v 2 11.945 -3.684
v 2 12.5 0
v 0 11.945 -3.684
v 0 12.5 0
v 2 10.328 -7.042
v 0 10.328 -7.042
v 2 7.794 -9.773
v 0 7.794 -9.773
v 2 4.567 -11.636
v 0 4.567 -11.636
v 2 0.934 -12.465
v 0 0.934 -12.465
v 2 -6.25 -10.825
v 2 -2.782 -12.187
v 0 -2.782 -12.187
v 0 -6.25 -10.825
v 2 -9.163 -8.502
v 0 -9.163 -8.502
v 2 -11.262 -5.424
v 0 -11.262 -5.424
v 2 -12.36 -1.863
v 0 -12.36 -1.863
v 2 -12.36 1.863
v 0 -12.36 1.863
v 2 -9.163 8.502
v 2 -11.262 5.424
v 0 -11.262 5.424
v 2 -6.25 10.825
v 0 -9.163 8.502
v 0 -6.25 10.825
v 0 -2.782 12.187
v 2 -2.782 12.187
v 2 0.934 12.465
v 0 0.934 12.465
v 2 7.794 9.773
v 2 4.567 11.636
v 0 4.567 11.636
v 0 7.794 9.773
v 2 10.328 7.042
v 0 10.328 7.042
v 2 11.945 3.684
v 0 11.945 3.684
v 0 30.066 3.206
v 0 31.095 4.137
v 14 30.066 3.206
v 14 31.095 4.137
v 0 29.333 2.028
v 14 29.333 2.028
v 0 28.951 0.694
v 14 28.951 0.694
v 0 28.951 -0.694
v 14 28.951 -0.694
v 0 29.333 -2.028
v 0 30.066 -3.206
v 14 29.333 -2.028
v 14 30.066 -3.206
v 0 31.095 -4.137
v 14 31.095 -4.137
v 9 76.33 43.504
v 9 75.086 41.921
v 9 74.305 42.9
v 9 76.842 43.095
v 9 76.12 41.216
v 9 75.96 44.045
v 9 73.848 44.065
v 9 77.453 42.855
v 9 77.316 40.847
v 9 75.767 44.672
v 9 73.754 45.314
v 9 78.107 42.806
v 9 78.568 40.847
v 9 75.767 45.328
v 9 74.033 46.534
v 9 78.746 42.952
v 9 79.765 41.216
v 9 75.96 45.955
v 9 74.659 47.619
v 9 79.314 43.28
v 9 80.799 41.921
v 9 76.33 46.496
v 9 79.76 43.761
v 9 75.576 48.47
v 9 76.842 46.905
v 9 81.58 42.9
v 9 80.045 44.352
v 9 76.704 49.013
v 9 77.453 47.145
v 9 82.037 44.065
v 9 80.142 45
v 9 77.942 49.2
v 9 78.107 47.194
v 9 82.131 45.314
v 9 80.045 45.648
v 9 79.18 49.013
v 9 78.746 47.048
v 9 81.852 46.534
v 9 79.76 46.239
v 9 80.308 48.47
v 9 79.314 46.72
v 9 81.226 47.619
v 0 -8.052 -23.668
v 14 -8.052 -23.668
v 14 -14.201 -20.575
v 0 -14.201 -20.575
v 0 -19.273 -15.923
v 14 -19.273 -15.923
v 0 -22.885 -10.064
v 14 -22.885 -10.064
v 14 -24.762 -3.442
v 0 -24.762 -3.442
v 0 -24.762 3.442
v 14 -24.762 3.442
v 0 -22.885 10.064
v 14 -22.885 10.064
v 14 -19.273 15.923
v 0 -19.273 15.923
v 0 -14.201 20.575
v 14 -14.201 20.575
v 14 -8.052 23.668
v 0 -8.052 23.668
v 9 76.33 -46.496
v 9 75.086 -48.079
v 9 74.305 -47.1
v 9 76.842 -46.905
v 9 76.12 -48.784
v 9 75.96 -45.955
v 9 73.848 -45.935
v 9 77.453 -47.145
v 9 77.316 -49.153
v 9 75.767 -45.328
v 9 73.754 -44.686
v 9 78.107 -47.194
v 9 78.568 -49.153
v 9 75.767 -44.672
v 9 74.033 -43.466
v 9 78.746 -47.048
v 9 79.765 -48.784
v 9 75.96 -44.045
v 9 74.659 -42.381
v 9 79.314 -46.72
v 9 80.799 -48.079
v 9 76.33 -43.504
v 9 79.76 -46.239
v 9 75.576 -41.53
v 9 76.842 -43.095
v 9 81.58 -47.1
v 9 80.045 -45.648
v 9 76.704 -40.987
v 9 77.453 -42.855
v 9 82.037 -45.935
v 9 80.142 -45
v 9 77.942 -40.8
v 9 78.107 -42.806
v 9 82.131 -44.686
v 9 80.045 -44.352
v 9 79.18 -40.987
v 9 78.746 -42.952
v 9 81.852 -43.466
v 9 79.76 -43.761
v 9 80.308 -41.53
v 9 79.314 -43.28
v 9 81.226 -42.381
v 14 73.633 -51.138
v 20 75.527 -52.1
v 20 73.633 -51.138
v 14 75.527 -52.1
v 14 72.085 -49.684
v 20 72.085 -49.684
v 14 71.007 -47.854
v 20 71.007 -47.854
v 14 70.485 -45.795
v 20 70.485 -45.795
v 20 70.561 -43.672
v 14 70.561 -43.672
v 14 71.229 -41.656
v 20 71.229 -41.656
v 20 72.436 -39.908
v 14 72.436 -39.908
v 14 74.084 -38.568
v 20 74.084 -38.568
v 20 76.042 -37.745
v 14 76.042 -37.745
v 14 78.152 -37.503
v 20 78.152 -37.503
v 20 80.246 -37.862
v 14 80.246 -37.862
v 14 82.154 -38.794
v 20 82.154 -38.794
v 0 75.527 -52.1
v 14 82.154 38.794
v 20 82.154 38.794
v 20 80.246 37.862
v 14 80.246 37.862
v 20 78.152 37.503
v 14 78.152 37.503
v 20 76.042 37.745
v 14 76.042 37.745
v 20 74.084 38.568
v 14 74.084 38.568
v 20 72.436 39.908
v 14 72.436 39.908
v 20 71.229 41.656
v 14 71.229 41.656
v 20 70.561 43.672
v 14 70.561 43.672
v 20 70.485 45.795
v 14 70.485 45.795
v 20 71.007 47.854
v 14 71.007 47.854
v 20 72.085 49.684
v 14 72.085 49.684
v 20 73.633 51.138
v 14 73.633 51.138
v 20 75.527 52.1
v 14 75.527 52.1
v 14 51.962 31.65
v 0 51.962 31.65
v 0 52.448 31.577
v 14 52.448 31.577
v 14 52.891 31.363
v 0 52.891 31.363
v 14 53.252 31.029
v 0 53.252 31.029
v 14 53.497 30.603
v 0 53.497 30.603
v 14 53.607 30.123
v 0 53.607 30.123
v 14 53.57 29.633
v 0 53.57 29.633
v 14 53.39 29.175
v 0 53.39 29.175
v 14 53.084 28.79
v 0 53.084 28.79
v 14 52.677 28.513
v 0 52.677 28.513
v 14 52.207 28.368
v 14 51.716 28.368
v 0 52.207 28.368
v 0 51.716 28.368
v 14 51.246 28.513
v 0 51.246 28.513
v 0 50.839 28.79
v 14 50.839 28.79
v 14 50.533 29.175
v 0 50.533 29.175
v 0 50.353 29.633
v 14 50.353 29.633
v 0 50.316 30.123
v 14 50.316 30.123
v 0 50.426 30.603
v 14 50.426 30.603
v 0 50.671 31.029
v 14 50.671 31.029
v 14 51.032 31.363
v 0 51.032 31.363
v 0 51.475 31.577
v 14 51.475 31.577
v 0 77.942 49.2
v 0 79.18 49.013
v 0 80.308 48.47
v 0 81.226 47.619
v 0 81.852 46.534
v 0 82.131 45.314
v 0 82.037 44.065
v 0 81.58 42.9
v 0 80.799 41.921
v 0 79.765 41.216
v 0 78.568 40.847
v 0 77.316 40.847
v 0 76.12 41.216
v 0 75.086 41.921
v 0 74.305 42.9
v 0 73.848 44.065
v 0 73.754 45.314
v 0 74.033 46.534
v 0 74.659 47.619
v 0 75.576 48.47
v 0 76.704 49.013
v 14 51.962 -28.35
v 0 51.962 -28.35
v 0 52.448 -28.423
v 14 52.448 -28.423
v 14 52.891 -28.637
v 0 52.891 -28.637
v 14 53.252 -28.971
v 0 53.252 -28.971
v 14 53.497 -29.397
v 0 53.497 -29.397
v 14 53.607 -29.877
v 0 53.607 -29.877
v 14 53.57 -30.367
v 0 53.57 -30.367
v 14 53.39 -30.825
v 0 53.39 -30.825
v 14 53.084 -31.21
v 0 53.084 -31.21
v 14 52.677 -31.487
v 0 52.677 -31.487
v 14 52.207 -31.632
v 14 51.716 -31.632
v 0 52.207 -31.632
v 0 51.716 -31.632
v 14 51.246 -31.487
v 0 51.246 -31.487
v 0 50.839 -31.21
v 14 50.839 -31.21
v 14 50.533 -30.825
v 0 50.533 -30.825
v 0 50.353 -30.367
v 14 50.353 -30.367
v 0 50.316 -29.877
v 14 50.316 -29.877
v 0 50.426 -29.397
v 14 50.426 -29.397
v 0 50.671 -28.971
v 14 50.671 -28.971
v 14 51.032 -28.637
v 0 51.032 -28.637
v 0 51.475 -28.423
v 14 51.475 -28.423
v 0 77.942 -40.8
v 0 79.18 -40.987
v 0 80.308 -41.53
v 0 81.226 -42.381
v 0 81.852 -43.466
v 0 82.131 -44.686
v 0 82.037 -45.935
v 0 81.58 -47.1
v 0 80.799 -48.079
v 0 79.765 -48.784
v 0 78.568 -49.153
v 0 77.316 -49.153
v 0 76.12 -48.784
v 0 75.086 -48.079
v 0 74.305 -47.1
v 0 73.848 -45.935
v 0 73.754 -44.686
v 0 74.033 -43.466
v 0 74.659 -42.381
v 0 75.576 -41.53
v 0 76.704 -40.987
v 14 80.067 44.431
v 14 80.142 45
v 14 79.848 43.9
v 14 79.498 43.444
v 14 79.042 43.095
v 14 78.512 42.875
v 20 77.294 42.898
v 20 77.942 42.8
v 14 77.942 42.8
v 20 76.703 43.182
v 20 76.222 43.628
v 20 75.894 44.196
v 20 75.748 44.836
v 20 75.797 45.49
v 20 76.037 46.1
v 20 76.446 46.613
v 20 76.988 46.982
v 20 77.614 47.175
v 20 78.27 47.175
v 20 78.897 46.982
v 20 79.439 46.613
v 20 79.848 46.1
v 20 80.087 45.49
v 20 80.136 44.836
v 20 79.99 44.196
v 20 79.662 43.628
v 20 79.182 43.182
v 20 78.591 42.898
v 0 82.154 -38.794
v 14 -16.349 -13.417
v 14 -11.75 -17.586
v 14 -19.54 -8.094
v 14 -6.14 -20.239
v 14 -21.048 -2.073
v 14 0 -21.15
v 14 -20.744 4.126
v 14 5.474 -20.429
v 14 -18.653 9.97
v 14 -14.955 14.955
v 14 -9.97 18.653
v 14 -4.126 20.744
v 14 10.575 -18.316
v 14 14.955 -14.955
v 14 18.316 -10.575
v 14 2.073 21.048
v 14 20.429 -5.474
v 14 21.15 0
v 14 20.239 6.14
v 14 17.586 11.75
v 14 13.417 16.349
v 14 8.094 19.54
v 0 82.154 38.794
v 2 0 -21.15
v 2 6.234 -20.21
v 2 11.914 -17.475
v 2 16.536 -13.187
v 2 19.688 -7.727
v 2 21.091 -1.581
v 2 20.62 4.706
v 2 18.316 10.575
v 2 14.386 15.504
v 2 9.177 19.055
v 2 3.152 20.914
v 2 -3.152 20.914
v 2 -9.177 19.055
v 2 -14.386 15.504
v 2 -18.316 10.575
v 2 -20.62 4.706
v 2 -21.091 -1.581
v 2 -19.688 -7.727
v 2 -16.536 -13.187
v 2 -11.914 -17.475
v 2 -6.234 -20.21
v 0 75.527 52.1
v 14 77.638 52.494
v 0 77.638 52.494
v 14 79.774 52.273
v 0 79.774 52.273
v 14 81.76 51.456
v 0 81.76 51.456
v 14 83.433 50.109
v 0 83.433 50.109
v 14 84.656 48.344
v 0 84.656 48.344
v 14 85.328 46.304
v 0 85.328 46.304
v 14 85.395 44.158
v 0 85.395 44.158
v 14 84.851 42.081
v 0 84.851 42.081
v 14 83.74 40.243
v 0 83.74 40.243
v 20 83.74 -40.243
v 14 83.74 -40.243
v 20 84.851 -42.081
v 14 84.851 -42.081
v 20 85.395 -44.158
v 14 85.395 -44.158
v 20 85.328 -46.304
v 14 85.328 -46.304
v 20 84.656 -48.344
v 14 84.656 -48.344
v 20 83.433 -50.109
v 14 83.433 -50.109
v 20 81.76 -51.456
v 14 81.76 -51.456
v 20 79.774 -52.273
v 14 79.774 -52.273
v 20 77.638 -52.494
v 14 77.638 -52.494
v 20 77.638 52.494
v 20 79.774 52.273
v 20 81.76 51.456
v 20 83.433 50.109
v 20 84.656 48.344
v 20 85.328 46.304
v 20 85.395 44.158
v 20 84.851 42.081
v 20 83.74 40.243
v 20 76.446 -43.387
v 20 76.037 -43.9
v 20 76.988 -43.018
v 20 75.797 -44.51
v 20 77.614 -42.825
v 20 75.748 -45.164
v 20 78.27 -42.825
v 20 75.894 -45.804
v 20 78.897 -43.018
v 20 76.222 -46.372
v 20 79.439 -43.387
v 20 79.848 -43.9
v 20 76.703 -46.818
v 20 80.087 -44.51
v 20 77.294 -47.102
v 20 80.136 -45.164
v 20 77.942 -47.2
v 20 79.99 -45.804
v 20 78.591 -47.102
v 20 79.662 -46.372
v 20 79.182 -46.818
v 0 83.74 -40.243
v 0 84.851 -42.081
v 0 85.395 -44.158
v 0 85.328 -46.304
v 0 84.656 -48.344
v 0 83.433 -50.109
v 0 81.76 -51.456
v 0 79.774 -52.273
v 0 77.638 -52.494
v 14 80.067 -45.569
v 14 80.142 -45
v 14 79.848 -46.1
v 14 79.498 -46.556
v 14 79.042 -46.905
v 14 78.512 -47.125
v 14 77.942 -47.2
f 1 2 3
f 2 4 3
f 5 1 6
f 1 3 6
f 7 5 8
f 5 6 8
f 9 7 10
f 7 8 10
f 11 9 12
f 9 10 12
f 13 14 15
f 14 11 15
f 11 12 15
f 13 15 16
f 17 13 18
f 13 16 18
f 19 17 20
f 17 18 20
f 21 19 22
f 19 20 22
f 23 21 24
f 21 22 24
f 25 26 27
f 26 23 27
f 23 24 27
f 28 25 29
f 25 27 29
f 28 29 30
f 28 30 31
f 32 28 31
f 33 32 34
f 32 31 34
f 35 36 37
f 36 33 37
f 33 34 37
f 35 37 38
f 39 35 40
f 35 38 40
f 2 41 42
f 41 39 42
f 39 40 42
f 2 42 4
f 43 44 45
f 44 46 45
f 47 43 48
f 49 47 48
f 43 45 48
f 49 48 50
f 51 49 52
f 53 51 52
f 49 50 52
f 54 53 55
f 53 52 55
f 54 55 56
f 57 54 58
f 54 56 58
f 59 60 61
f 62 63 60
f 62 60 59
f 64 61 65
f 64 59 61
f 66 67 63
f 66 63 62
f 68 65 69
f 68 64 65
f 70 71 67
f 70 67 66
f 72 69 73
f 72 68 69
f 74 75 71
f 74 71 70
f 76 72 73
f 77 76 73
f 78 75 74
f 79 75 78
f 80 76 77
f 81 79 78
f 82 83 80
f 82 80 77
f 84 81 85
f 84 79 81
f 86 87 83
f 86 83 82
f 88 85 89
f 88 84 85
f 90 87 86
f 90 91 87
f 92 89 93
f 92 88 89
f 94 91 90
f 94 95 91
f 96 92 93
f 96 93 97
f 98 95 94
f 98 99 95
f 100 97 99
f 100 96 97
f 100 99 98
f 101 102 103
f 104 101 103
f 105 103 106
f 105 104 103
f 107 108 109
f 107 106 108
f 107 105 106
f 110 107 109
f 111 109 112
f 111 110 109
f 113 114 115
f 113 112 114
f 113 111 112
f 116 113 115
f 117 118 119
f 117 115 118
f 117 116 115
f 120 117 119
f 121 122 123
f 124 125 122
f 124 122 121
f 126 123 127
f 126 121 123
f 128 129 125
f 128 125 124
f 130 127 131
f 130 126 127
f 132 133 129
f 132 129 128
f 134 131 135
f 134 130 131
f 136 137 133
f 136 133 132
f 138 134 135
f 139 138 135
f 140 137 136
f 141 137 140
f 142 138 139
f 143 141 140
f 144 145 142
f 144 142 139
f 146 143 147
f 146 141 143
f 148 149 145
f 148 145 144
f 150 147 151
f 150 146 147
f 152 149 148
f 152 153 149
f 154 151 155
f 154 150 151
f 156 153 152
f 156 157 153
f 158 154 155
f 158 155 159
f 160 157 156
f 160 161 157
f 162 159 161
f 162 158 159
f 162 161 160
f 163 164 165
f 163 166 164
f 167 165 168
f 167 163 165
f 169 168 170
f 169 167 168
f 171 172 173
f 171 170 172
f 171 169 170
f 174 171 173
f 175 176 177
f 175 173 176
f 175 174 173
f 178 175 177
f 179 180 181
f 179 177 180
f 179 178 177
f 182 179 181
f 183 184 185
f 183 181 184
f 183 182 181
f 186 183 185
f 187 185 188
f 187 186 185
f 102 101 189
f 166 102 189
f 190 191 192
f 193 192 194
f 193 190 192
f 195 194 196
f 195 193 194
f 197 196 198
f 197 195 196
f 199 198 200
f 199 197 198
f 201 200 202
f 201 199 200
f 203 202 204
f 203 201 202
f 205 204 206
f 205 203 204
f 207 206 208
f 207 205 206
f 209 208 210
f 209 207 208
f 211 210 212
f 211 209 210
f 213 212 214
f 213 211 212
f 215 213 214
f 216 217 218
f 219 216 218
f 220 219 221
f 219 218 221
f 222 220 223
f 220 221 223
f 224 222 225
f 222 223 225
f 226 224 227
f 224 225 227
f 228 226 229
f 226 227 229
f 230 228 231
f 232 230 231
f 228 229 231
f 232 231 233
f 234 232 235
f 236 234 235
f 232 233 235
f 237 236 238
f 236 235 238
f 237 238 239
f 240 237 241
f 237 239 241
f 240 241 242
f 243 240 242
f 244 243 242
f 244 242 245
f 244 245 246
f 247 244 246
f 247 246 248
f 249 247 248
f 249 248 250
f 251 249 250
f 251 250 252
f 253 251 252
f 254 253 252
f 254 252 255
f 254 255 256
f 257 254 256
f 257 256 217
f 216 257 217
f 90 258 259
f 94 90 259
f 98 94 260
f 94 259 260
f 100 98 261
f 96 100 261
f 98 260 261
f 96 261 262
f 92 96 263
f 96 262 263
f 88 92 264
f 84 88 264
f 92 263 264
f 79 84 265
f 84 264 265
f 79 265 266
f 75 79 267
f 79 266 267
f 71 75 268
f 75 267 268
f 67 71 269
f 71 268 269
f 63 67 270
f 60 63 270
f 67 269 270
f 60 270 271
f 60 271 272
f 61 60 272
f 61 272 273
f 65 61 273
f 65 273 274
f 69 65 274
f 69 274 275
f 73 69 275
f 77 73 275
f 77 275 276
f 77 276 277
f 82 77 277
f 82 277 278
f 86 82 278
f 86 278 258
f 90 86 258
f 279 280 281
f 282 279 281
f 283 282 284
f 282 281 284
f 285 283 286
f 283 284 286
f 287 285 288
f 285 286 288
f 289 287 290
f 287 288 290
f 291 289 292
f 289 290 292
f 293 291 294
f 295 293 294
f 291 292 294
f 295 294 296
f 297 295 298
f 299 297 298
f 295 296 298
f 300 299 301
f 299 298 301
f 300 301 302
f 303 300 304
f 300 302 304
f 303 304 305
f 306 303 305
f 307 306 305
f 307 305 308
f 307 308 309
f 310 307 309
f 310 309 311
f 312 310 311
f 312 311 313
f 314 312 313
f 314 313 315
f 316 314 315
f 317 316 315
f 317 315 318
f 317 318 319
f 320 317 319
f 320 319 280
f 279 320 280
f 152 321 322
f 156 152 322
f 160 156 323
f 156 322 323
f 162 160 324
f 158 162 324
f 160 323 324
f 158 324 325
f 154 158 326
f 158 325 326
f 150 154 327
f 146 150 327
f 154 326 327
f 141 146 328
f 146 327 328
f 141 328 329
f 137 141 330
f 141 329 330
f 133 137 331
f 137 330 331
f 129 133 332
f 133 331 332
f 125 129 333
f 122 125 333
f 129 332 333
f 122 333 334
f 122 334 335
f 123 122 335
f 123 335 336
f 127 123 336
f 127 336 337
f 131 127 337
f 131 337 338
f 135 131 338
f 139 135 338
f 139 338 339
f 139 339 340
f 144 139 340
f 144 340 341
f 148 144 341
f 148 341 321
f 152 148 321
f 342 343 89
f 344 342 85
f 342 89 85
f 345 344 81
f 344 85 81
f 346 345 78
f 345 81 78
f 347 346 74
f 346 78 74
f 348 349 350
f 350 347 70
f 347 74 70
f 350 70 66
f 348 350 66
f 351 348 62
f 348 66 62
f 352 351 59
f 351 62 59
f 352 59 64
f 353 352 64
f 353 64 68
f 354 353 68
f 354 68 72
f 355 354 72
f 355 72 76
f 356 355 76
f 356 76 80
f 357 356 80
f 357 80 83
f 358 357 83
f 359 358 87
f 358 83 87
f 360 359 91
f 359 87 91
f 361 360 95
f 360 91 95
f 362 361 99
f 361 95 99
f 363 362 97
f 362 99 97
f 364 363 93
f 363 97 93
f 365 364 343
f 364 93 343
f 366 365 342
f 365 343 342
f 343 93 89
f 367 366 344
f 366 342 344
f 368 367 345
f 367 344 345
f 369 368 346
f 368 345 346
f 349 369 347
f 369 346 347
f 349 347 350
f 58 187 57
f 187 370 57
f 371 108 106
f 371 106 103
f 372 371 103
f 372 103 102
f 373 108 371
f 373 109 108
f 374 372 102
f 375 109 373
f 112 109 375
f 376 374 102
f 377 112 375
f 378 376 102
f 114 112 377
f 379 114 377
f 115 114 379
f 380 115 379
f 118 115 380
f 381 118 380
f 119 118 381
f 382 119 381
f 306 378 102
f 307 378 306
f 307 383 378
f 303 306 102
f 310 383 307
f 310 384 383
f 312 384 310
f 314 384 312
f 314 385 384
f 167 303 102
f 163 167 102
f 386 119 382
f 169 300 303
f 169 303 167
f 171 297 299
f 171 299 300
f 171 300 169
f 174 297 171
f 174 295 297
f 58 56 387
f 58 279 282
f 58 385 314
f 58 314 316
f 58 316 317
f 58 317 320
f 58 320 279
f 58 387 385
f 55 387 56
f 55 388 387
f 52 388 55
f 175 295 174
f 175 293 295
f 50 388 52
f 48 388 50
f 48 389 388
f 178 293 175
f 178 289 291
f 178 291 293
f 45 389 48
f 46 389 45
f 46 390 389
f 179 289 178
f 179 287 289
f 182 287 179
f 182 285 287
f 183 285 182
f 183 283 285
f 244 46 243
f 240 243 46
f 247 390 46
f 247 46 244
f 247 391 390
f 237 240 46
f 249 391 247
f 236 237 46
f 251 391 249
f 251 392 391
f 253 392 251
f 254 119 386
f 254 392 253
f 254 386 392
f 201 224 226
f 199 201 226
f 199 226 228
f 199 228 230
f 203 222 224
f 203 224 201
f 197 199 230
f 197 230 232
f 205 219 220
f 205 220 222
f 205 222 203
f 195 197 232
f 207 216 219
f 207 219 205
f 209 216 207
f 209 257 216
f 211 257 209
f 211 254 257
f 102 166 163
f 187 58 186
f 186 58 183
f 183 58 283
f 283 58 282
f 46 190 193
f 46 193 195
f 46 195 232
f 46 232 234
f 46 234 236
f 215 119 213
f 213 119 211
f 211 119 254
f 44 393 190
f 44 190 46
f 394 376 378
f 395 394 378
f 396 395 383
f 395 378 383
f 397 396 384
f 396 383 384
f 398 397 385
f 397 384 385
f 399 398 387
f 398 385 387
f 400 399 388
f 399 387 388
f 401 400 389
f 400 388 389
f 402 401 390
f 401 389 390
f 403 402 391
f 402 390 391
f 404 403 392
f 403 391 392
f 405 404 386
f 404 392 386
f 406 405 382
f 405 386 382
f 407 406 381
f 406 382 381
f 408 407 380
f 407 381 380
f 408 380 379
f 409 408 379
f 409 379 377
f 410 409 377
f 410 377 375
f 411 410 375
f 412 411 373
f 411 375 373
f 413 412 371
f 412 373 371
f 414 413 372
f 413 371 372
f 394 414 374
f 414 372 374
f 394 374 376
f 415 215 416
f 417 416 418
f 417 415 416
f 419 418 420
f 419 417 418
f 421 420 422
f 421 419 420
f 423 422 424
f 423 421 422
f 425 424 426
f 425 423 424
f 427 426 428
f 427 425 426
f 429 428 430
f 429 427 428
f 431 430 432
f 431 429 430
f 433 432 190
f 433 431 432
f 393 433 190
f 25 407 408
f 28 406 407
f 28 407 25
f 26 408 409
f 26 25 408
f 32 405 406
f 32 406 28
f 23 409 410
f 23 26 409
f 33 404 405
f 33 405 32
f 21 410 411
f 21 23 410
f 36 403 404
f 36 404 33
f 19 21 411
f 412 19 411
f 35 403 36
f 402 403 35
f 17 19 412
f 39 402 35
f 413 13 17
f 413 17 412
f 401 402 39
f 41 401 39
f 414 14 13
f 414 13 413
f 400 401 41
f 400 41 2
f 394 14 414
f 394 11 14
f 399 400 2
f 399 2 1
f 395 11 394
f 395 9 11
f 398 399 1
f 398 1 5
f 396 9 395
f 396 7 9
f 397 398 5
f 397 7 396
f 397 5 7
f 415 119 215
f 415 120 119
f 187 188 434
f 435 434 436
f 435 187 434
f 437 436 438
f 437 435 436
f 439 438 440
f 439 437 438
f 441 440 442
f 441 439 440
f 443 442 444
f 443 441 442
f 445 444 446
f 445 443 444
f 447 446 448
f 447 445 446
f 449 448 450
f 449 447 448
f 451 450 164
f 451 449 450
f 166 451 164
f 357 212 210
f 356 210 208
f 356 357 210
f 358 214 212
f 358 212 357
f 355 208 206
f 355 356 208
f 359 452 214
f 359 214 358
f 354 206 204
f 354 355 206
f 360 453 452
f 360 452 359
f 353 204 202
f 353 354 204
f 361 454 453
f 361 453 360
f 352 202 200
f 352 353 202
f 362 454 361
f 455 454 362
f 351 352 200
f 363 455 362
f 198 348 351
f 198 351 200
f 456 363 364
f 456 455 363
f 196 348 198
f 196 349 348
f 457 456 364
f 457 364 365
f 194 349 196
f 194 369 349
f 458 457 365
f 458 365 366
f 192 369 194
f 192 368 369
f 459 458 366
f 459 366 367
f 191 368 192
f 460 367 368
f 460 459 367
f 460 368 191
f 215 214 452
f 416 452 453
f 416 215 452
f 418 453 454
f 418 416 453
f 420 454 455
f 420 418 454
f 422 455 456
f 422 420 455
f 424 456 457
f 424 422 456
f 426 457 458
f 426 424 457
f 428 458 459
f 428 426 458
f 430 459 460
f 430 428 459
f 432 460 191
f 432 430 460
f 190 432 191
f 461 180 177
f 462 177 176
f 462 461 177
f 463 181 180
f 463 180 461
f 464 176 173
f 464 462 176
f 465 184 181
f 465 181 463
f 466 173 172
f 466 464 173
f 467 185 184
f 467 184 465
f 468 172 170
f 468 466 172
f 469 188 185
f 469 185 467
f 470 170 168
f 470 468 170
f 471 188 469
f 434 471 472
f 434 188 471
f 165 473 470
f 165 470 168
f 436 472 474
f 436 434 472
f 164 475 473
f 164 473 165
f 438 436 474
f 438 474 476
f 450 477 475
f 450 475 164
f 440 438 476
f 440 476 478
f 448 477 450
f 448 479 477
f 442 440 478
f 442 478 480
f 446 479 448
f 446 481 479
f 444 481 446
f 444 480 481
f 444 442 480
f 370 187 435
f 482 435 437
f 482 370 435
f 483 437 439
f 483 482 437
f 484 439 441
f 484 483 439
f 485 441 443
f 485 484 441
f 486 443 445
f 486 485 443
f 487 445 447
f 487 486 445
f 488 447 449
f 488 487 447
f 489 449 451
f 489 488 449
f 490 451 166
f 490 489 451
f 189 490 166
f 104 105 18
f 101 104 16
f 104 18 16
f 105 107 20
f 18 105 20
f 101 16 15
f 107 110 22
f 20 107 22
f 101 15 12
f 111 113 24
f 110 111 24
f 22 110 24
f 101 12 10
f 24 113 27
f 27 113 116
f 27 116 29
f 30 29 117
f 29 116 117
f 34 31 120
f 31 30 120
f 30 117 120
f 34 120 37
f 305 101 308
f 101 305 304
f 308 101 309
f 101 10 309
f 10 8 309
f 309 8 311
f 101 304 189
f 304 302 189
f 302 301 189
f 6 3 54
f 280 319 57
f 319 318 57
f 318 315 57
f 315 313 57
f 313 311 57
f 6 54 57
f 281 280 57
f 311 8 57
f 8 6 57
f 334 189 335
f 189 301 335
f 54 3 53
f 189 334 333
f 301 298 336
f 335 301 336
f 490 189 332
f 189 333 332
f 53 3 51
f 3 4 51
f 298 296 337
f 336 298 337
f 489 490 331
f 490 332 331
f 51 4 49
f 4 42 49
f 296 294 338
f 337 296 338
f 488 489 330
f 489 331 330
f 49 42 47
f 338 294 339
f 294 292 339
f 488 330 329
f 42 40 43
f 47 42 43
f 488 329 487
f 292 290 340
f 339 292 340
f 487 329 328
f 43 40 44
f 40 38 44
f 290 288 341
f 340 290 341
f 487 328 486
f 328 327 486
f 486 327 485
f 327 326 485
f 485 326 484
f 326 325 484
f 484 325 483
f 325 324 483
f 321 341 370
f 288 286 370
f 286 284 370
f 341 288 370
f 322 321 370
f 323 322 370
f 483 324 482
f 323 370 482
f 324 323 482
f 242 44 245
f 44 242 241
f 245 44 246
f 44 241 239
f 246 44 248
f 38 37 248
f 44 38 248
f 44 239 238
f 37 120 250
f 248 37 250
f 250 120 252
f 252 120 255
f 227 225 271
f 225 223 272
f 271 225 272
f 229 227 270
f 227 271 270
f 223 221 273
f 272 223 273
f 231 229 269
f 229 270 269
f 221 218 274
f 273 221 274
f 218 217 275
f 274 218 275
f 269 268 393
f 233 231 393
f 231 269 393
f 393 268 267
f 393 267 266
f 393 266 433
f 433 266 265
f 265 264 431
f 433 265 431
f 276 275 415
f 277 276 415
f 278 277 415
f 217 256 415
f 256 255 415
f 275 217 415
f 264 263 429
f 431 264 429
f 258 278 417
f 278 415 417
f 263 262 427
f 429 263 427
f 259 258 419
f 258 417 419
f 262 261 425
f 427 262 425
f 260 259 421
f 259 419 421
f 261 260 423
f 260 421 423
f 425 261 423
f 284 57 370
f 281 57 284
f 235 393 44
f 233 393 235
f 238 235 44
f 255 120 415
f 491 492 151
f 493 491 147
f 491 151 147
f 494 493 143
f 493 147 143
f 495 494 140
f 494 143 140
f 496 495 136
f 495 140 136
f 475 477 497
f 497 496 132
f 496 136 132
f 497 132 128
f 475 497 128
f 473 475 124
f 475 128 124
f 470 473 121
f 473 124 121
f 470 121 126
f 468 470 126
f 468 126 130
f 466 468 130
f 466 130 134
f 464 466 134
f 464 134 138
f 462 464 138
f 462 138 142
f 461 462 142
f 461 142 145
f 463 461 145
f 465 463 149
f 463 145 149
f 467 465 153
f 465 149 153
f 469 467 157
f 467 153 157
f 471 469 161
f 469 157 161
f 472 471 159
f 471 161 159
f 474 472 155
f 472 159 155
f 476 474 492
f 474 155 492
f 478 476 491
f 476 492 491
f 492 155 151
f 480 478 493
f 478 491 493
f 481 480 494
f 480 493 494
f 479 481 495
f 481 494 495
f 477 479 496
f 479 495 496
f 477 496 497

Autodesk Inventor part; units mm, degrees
ref_plane "YZ Plane" through (0, 0, 0) normal (1, 0, 0) x (0, 1, 0)
ref_plane "XZ Plane" through (0, 0, 0) normal (0, 1, 0) x (-1, 0, 0)
ref_plane "XY Plane" through (0, 0, 0) normal (0, 0, 1) x (1, 0, 0)
sketch "Sketch1" plane through (0, 0, 0) normal (1, 0, 0) x (0, 1, 0)
  circle A0 centre (0, 0) radius 90 construction
  circle A1 centre (0, 0) radius 12.5
  circle A2 centre (0, 0) radius 25
  line L0 (77.9423, 45) -> (77.9423, -45) construction
  line L1 (-8.0516, 23.668) -> (75.5268, 52.1004)
  circle A3 centre (77.9423, 45) radius 2.2
  circle A4 centre (77.9423, 45) radius 7.5
  line L2 (82.1544, 38.7945) -> (25, 0)
  line L3 (0, 0) -> (51.9077, 0)
  line L4 (-8.0516, -23.668) -> (75.5268, -52.1004)
  circle A5 centre (77.9423, -45) radius 2.2
  circle A6 centre (77.9423, -45) radius 7.5
  line L5 (82.1544, -38.7945) -> (25, 0)
  point P0 (77.9423, 0)
  dimension "d0" = 180
  dimension "d1" = 25
  dimension "d2" = 50
  dimension "d3" = 90
  dimension "d4" = 4.4
  dimension "d5" = 15
extrude "Extrusion1" add sketch "Sketch1" along normal blind 14
fillet "Fillet1" radius 5 1 edges at (7, 25, 0)
sketch "Sketch2" plane through (14, 0, 0) normal (1, 0, 0) x (0, 0, -1)
  circle A0 centre (0, 0) radius 12.5 projected
  circle A1 centre (0, 0) radius 21.15
  dimension "d9" = 42.3
extrude "Extrusion2" cut sketch "Sketch2" against normal blind 12
sketch "Sketch3" plane through (14, 0, 0) normal (1, 0, 0) x (0, 0, -1)
  circle A0 centre (0, 0) radius 21.15 projected
  arc A1 (-38.7945, 82.1544) -> (-52.1004, 75.5268) centre (-45, 77.9423) ccw projected
  line L0 (-52.1004, 75.5268) -> (-23.668, -8.0516) projected
  arc A2 (-23.668, -8.0516) -> (23.668, -8.0516) centre (0, 0) ccw projected
  line L1 (23.668, -8.0516) -> (52.1004, 75.5268) projected
  arc A3 (52.1004, 75.5268) -> (38.7945, 82.1544) centre (45, 77.9423) ccw projected
  line L2 (38.7945, 82.1544) -> (4.137, 31.0949) projected
  arc A4 (-4.137, 31.0949) -> (4.137, 31.0949) centre (0, 33.9029) ccw projected
  line L3 (-4.137, 31.0949) -> (-38.7945, 82.1544) projected
  circle A5 centre (45, 77.9423) radius 2.2 projected
  circle A6 centre (-45, 77.9423) radius 2.2 projected
  circle A7 centre (-45, 77.9423) radius 7.5
  circle A8 centre (45, 77.9423) radius 7.5
  point P0 (38.7945, 82.1544)
  point P1 (52.1004, 75.5268)
  point P2 (-52.1004, 75.5268)
extrude "Extrusion3" add sketch "Sketch3" along normal blind 6 contours A7 A1 | A3 A8
sketch "Sketch4" plane through (0, 0, 0) normal (-1, 0, 0) x (0, 0, 1)
  arc A0 (52.1004, 75.5268) -> (38.7945, 82.1544) centre (45, 77.9423) ccw projected
  line L0 (4.137, 31.0949) -> (38.7945, 82.1544) projected
  arc A1 (-4.137, 31.0949) -> (4.137, 31.0949) centre (0, 33.9029) ccw projected
  line L1 (-38.7945, 82.1544) -> (-4.137, 31.0949) projected
  arc A2 (-38.7945, 82.1544) -> (-52.1004, 75.5268) centre (-45, 77.9423) ccw projected
  line L2 (-23.668, -8.0516) -> (-52.1004, 75.5268) projected
  arc A3 (-23.668, -8.0516) -> (23.668, -8.0516) centre (0, 0) ccw projected
  line L3 (52.1004, 75.5268) -> (23.668, -8.0516) projected
  circle A4 centre (-45, 77.9423) radius 2.2 projected
  circle A5 centre (45, 77.9423) radius 2.2 projected
  circle A6 centre (0, 0) radius 12.5 projected
  circle A7 centre (-45, 77.9423) radius 4.2
  circle A8 centre (45, 77.9423) radius 4.2
  dimension "d14" = 8.4
extrude "Extrusion4" cut sketch "Sketch4" against normal blind 9 contours A4 | A5 | A7 | A8
sketch "Sketch5" plane through (0, 0, 0) normal (-1, 0, 0) x (0, 0, 1)
  circle A0 centre (45, 77.9423) radius 4.2 projected
  circle A1 centre (-45, 77.9423) radius 4.2 projected
  arc A2 (52.1004, 75.5268) -> (38.7945, 82.1544) centre (45, 77.9423) ccw projected
  line L0 (4.137, 31.0949) -> (38.7945, 82.1544) projected
  arc A3 (-4.137, 31.0949) -> (4.137, 31.0949) centre (0, 33.9029) ccw projected
  line L1 (-38.7945, 82.1544) -> (-4.137, 31.0949) projected
  arc A4 (-38.7945, 82.1544) -> (-52.1004, 75.5268) centre (-45, 77.9423) ccw projected
  line L2 (-23.668, -8.0516) -> (-52.1004, 75.5268) projected
  arc A5 (-23.668, -8.0516) -> (23.668, -8.0516) centre (0, 0) ccw projected
  line L3 (52.1004, 75.5268) -> (23.668, -8.0516) projected
  circle A6 centre (0, 0) radius 12.5 projected
  line L4 (-30, 51.9615) -> (30, 51.9615) construction
  line L5 (-45, 77.9423) -> (0, 0)
  circle A7 centre (45, 77.9423) radius 2.2 projected
  line L6 (0, 0) -> (45, 77.9423)
  circle A8 centre (-30, 51.9615) radius 1.65
  circle A9 centre (30, 51.9615) radius 1.65
  point P0 (0, 51.9615)
  dimension "d17" = 60
  dimension "d18" = 3.3
  dimension "d19" = 3.3
extrude "Extrusion5" cut sketch "Sketch5" against normal through all contours A8 L5 | L5 A8 | A9 L6 | L6 A9
properties part number "SOPORTE_RODAMIENTO" material "Steel, Mild, Welded"
